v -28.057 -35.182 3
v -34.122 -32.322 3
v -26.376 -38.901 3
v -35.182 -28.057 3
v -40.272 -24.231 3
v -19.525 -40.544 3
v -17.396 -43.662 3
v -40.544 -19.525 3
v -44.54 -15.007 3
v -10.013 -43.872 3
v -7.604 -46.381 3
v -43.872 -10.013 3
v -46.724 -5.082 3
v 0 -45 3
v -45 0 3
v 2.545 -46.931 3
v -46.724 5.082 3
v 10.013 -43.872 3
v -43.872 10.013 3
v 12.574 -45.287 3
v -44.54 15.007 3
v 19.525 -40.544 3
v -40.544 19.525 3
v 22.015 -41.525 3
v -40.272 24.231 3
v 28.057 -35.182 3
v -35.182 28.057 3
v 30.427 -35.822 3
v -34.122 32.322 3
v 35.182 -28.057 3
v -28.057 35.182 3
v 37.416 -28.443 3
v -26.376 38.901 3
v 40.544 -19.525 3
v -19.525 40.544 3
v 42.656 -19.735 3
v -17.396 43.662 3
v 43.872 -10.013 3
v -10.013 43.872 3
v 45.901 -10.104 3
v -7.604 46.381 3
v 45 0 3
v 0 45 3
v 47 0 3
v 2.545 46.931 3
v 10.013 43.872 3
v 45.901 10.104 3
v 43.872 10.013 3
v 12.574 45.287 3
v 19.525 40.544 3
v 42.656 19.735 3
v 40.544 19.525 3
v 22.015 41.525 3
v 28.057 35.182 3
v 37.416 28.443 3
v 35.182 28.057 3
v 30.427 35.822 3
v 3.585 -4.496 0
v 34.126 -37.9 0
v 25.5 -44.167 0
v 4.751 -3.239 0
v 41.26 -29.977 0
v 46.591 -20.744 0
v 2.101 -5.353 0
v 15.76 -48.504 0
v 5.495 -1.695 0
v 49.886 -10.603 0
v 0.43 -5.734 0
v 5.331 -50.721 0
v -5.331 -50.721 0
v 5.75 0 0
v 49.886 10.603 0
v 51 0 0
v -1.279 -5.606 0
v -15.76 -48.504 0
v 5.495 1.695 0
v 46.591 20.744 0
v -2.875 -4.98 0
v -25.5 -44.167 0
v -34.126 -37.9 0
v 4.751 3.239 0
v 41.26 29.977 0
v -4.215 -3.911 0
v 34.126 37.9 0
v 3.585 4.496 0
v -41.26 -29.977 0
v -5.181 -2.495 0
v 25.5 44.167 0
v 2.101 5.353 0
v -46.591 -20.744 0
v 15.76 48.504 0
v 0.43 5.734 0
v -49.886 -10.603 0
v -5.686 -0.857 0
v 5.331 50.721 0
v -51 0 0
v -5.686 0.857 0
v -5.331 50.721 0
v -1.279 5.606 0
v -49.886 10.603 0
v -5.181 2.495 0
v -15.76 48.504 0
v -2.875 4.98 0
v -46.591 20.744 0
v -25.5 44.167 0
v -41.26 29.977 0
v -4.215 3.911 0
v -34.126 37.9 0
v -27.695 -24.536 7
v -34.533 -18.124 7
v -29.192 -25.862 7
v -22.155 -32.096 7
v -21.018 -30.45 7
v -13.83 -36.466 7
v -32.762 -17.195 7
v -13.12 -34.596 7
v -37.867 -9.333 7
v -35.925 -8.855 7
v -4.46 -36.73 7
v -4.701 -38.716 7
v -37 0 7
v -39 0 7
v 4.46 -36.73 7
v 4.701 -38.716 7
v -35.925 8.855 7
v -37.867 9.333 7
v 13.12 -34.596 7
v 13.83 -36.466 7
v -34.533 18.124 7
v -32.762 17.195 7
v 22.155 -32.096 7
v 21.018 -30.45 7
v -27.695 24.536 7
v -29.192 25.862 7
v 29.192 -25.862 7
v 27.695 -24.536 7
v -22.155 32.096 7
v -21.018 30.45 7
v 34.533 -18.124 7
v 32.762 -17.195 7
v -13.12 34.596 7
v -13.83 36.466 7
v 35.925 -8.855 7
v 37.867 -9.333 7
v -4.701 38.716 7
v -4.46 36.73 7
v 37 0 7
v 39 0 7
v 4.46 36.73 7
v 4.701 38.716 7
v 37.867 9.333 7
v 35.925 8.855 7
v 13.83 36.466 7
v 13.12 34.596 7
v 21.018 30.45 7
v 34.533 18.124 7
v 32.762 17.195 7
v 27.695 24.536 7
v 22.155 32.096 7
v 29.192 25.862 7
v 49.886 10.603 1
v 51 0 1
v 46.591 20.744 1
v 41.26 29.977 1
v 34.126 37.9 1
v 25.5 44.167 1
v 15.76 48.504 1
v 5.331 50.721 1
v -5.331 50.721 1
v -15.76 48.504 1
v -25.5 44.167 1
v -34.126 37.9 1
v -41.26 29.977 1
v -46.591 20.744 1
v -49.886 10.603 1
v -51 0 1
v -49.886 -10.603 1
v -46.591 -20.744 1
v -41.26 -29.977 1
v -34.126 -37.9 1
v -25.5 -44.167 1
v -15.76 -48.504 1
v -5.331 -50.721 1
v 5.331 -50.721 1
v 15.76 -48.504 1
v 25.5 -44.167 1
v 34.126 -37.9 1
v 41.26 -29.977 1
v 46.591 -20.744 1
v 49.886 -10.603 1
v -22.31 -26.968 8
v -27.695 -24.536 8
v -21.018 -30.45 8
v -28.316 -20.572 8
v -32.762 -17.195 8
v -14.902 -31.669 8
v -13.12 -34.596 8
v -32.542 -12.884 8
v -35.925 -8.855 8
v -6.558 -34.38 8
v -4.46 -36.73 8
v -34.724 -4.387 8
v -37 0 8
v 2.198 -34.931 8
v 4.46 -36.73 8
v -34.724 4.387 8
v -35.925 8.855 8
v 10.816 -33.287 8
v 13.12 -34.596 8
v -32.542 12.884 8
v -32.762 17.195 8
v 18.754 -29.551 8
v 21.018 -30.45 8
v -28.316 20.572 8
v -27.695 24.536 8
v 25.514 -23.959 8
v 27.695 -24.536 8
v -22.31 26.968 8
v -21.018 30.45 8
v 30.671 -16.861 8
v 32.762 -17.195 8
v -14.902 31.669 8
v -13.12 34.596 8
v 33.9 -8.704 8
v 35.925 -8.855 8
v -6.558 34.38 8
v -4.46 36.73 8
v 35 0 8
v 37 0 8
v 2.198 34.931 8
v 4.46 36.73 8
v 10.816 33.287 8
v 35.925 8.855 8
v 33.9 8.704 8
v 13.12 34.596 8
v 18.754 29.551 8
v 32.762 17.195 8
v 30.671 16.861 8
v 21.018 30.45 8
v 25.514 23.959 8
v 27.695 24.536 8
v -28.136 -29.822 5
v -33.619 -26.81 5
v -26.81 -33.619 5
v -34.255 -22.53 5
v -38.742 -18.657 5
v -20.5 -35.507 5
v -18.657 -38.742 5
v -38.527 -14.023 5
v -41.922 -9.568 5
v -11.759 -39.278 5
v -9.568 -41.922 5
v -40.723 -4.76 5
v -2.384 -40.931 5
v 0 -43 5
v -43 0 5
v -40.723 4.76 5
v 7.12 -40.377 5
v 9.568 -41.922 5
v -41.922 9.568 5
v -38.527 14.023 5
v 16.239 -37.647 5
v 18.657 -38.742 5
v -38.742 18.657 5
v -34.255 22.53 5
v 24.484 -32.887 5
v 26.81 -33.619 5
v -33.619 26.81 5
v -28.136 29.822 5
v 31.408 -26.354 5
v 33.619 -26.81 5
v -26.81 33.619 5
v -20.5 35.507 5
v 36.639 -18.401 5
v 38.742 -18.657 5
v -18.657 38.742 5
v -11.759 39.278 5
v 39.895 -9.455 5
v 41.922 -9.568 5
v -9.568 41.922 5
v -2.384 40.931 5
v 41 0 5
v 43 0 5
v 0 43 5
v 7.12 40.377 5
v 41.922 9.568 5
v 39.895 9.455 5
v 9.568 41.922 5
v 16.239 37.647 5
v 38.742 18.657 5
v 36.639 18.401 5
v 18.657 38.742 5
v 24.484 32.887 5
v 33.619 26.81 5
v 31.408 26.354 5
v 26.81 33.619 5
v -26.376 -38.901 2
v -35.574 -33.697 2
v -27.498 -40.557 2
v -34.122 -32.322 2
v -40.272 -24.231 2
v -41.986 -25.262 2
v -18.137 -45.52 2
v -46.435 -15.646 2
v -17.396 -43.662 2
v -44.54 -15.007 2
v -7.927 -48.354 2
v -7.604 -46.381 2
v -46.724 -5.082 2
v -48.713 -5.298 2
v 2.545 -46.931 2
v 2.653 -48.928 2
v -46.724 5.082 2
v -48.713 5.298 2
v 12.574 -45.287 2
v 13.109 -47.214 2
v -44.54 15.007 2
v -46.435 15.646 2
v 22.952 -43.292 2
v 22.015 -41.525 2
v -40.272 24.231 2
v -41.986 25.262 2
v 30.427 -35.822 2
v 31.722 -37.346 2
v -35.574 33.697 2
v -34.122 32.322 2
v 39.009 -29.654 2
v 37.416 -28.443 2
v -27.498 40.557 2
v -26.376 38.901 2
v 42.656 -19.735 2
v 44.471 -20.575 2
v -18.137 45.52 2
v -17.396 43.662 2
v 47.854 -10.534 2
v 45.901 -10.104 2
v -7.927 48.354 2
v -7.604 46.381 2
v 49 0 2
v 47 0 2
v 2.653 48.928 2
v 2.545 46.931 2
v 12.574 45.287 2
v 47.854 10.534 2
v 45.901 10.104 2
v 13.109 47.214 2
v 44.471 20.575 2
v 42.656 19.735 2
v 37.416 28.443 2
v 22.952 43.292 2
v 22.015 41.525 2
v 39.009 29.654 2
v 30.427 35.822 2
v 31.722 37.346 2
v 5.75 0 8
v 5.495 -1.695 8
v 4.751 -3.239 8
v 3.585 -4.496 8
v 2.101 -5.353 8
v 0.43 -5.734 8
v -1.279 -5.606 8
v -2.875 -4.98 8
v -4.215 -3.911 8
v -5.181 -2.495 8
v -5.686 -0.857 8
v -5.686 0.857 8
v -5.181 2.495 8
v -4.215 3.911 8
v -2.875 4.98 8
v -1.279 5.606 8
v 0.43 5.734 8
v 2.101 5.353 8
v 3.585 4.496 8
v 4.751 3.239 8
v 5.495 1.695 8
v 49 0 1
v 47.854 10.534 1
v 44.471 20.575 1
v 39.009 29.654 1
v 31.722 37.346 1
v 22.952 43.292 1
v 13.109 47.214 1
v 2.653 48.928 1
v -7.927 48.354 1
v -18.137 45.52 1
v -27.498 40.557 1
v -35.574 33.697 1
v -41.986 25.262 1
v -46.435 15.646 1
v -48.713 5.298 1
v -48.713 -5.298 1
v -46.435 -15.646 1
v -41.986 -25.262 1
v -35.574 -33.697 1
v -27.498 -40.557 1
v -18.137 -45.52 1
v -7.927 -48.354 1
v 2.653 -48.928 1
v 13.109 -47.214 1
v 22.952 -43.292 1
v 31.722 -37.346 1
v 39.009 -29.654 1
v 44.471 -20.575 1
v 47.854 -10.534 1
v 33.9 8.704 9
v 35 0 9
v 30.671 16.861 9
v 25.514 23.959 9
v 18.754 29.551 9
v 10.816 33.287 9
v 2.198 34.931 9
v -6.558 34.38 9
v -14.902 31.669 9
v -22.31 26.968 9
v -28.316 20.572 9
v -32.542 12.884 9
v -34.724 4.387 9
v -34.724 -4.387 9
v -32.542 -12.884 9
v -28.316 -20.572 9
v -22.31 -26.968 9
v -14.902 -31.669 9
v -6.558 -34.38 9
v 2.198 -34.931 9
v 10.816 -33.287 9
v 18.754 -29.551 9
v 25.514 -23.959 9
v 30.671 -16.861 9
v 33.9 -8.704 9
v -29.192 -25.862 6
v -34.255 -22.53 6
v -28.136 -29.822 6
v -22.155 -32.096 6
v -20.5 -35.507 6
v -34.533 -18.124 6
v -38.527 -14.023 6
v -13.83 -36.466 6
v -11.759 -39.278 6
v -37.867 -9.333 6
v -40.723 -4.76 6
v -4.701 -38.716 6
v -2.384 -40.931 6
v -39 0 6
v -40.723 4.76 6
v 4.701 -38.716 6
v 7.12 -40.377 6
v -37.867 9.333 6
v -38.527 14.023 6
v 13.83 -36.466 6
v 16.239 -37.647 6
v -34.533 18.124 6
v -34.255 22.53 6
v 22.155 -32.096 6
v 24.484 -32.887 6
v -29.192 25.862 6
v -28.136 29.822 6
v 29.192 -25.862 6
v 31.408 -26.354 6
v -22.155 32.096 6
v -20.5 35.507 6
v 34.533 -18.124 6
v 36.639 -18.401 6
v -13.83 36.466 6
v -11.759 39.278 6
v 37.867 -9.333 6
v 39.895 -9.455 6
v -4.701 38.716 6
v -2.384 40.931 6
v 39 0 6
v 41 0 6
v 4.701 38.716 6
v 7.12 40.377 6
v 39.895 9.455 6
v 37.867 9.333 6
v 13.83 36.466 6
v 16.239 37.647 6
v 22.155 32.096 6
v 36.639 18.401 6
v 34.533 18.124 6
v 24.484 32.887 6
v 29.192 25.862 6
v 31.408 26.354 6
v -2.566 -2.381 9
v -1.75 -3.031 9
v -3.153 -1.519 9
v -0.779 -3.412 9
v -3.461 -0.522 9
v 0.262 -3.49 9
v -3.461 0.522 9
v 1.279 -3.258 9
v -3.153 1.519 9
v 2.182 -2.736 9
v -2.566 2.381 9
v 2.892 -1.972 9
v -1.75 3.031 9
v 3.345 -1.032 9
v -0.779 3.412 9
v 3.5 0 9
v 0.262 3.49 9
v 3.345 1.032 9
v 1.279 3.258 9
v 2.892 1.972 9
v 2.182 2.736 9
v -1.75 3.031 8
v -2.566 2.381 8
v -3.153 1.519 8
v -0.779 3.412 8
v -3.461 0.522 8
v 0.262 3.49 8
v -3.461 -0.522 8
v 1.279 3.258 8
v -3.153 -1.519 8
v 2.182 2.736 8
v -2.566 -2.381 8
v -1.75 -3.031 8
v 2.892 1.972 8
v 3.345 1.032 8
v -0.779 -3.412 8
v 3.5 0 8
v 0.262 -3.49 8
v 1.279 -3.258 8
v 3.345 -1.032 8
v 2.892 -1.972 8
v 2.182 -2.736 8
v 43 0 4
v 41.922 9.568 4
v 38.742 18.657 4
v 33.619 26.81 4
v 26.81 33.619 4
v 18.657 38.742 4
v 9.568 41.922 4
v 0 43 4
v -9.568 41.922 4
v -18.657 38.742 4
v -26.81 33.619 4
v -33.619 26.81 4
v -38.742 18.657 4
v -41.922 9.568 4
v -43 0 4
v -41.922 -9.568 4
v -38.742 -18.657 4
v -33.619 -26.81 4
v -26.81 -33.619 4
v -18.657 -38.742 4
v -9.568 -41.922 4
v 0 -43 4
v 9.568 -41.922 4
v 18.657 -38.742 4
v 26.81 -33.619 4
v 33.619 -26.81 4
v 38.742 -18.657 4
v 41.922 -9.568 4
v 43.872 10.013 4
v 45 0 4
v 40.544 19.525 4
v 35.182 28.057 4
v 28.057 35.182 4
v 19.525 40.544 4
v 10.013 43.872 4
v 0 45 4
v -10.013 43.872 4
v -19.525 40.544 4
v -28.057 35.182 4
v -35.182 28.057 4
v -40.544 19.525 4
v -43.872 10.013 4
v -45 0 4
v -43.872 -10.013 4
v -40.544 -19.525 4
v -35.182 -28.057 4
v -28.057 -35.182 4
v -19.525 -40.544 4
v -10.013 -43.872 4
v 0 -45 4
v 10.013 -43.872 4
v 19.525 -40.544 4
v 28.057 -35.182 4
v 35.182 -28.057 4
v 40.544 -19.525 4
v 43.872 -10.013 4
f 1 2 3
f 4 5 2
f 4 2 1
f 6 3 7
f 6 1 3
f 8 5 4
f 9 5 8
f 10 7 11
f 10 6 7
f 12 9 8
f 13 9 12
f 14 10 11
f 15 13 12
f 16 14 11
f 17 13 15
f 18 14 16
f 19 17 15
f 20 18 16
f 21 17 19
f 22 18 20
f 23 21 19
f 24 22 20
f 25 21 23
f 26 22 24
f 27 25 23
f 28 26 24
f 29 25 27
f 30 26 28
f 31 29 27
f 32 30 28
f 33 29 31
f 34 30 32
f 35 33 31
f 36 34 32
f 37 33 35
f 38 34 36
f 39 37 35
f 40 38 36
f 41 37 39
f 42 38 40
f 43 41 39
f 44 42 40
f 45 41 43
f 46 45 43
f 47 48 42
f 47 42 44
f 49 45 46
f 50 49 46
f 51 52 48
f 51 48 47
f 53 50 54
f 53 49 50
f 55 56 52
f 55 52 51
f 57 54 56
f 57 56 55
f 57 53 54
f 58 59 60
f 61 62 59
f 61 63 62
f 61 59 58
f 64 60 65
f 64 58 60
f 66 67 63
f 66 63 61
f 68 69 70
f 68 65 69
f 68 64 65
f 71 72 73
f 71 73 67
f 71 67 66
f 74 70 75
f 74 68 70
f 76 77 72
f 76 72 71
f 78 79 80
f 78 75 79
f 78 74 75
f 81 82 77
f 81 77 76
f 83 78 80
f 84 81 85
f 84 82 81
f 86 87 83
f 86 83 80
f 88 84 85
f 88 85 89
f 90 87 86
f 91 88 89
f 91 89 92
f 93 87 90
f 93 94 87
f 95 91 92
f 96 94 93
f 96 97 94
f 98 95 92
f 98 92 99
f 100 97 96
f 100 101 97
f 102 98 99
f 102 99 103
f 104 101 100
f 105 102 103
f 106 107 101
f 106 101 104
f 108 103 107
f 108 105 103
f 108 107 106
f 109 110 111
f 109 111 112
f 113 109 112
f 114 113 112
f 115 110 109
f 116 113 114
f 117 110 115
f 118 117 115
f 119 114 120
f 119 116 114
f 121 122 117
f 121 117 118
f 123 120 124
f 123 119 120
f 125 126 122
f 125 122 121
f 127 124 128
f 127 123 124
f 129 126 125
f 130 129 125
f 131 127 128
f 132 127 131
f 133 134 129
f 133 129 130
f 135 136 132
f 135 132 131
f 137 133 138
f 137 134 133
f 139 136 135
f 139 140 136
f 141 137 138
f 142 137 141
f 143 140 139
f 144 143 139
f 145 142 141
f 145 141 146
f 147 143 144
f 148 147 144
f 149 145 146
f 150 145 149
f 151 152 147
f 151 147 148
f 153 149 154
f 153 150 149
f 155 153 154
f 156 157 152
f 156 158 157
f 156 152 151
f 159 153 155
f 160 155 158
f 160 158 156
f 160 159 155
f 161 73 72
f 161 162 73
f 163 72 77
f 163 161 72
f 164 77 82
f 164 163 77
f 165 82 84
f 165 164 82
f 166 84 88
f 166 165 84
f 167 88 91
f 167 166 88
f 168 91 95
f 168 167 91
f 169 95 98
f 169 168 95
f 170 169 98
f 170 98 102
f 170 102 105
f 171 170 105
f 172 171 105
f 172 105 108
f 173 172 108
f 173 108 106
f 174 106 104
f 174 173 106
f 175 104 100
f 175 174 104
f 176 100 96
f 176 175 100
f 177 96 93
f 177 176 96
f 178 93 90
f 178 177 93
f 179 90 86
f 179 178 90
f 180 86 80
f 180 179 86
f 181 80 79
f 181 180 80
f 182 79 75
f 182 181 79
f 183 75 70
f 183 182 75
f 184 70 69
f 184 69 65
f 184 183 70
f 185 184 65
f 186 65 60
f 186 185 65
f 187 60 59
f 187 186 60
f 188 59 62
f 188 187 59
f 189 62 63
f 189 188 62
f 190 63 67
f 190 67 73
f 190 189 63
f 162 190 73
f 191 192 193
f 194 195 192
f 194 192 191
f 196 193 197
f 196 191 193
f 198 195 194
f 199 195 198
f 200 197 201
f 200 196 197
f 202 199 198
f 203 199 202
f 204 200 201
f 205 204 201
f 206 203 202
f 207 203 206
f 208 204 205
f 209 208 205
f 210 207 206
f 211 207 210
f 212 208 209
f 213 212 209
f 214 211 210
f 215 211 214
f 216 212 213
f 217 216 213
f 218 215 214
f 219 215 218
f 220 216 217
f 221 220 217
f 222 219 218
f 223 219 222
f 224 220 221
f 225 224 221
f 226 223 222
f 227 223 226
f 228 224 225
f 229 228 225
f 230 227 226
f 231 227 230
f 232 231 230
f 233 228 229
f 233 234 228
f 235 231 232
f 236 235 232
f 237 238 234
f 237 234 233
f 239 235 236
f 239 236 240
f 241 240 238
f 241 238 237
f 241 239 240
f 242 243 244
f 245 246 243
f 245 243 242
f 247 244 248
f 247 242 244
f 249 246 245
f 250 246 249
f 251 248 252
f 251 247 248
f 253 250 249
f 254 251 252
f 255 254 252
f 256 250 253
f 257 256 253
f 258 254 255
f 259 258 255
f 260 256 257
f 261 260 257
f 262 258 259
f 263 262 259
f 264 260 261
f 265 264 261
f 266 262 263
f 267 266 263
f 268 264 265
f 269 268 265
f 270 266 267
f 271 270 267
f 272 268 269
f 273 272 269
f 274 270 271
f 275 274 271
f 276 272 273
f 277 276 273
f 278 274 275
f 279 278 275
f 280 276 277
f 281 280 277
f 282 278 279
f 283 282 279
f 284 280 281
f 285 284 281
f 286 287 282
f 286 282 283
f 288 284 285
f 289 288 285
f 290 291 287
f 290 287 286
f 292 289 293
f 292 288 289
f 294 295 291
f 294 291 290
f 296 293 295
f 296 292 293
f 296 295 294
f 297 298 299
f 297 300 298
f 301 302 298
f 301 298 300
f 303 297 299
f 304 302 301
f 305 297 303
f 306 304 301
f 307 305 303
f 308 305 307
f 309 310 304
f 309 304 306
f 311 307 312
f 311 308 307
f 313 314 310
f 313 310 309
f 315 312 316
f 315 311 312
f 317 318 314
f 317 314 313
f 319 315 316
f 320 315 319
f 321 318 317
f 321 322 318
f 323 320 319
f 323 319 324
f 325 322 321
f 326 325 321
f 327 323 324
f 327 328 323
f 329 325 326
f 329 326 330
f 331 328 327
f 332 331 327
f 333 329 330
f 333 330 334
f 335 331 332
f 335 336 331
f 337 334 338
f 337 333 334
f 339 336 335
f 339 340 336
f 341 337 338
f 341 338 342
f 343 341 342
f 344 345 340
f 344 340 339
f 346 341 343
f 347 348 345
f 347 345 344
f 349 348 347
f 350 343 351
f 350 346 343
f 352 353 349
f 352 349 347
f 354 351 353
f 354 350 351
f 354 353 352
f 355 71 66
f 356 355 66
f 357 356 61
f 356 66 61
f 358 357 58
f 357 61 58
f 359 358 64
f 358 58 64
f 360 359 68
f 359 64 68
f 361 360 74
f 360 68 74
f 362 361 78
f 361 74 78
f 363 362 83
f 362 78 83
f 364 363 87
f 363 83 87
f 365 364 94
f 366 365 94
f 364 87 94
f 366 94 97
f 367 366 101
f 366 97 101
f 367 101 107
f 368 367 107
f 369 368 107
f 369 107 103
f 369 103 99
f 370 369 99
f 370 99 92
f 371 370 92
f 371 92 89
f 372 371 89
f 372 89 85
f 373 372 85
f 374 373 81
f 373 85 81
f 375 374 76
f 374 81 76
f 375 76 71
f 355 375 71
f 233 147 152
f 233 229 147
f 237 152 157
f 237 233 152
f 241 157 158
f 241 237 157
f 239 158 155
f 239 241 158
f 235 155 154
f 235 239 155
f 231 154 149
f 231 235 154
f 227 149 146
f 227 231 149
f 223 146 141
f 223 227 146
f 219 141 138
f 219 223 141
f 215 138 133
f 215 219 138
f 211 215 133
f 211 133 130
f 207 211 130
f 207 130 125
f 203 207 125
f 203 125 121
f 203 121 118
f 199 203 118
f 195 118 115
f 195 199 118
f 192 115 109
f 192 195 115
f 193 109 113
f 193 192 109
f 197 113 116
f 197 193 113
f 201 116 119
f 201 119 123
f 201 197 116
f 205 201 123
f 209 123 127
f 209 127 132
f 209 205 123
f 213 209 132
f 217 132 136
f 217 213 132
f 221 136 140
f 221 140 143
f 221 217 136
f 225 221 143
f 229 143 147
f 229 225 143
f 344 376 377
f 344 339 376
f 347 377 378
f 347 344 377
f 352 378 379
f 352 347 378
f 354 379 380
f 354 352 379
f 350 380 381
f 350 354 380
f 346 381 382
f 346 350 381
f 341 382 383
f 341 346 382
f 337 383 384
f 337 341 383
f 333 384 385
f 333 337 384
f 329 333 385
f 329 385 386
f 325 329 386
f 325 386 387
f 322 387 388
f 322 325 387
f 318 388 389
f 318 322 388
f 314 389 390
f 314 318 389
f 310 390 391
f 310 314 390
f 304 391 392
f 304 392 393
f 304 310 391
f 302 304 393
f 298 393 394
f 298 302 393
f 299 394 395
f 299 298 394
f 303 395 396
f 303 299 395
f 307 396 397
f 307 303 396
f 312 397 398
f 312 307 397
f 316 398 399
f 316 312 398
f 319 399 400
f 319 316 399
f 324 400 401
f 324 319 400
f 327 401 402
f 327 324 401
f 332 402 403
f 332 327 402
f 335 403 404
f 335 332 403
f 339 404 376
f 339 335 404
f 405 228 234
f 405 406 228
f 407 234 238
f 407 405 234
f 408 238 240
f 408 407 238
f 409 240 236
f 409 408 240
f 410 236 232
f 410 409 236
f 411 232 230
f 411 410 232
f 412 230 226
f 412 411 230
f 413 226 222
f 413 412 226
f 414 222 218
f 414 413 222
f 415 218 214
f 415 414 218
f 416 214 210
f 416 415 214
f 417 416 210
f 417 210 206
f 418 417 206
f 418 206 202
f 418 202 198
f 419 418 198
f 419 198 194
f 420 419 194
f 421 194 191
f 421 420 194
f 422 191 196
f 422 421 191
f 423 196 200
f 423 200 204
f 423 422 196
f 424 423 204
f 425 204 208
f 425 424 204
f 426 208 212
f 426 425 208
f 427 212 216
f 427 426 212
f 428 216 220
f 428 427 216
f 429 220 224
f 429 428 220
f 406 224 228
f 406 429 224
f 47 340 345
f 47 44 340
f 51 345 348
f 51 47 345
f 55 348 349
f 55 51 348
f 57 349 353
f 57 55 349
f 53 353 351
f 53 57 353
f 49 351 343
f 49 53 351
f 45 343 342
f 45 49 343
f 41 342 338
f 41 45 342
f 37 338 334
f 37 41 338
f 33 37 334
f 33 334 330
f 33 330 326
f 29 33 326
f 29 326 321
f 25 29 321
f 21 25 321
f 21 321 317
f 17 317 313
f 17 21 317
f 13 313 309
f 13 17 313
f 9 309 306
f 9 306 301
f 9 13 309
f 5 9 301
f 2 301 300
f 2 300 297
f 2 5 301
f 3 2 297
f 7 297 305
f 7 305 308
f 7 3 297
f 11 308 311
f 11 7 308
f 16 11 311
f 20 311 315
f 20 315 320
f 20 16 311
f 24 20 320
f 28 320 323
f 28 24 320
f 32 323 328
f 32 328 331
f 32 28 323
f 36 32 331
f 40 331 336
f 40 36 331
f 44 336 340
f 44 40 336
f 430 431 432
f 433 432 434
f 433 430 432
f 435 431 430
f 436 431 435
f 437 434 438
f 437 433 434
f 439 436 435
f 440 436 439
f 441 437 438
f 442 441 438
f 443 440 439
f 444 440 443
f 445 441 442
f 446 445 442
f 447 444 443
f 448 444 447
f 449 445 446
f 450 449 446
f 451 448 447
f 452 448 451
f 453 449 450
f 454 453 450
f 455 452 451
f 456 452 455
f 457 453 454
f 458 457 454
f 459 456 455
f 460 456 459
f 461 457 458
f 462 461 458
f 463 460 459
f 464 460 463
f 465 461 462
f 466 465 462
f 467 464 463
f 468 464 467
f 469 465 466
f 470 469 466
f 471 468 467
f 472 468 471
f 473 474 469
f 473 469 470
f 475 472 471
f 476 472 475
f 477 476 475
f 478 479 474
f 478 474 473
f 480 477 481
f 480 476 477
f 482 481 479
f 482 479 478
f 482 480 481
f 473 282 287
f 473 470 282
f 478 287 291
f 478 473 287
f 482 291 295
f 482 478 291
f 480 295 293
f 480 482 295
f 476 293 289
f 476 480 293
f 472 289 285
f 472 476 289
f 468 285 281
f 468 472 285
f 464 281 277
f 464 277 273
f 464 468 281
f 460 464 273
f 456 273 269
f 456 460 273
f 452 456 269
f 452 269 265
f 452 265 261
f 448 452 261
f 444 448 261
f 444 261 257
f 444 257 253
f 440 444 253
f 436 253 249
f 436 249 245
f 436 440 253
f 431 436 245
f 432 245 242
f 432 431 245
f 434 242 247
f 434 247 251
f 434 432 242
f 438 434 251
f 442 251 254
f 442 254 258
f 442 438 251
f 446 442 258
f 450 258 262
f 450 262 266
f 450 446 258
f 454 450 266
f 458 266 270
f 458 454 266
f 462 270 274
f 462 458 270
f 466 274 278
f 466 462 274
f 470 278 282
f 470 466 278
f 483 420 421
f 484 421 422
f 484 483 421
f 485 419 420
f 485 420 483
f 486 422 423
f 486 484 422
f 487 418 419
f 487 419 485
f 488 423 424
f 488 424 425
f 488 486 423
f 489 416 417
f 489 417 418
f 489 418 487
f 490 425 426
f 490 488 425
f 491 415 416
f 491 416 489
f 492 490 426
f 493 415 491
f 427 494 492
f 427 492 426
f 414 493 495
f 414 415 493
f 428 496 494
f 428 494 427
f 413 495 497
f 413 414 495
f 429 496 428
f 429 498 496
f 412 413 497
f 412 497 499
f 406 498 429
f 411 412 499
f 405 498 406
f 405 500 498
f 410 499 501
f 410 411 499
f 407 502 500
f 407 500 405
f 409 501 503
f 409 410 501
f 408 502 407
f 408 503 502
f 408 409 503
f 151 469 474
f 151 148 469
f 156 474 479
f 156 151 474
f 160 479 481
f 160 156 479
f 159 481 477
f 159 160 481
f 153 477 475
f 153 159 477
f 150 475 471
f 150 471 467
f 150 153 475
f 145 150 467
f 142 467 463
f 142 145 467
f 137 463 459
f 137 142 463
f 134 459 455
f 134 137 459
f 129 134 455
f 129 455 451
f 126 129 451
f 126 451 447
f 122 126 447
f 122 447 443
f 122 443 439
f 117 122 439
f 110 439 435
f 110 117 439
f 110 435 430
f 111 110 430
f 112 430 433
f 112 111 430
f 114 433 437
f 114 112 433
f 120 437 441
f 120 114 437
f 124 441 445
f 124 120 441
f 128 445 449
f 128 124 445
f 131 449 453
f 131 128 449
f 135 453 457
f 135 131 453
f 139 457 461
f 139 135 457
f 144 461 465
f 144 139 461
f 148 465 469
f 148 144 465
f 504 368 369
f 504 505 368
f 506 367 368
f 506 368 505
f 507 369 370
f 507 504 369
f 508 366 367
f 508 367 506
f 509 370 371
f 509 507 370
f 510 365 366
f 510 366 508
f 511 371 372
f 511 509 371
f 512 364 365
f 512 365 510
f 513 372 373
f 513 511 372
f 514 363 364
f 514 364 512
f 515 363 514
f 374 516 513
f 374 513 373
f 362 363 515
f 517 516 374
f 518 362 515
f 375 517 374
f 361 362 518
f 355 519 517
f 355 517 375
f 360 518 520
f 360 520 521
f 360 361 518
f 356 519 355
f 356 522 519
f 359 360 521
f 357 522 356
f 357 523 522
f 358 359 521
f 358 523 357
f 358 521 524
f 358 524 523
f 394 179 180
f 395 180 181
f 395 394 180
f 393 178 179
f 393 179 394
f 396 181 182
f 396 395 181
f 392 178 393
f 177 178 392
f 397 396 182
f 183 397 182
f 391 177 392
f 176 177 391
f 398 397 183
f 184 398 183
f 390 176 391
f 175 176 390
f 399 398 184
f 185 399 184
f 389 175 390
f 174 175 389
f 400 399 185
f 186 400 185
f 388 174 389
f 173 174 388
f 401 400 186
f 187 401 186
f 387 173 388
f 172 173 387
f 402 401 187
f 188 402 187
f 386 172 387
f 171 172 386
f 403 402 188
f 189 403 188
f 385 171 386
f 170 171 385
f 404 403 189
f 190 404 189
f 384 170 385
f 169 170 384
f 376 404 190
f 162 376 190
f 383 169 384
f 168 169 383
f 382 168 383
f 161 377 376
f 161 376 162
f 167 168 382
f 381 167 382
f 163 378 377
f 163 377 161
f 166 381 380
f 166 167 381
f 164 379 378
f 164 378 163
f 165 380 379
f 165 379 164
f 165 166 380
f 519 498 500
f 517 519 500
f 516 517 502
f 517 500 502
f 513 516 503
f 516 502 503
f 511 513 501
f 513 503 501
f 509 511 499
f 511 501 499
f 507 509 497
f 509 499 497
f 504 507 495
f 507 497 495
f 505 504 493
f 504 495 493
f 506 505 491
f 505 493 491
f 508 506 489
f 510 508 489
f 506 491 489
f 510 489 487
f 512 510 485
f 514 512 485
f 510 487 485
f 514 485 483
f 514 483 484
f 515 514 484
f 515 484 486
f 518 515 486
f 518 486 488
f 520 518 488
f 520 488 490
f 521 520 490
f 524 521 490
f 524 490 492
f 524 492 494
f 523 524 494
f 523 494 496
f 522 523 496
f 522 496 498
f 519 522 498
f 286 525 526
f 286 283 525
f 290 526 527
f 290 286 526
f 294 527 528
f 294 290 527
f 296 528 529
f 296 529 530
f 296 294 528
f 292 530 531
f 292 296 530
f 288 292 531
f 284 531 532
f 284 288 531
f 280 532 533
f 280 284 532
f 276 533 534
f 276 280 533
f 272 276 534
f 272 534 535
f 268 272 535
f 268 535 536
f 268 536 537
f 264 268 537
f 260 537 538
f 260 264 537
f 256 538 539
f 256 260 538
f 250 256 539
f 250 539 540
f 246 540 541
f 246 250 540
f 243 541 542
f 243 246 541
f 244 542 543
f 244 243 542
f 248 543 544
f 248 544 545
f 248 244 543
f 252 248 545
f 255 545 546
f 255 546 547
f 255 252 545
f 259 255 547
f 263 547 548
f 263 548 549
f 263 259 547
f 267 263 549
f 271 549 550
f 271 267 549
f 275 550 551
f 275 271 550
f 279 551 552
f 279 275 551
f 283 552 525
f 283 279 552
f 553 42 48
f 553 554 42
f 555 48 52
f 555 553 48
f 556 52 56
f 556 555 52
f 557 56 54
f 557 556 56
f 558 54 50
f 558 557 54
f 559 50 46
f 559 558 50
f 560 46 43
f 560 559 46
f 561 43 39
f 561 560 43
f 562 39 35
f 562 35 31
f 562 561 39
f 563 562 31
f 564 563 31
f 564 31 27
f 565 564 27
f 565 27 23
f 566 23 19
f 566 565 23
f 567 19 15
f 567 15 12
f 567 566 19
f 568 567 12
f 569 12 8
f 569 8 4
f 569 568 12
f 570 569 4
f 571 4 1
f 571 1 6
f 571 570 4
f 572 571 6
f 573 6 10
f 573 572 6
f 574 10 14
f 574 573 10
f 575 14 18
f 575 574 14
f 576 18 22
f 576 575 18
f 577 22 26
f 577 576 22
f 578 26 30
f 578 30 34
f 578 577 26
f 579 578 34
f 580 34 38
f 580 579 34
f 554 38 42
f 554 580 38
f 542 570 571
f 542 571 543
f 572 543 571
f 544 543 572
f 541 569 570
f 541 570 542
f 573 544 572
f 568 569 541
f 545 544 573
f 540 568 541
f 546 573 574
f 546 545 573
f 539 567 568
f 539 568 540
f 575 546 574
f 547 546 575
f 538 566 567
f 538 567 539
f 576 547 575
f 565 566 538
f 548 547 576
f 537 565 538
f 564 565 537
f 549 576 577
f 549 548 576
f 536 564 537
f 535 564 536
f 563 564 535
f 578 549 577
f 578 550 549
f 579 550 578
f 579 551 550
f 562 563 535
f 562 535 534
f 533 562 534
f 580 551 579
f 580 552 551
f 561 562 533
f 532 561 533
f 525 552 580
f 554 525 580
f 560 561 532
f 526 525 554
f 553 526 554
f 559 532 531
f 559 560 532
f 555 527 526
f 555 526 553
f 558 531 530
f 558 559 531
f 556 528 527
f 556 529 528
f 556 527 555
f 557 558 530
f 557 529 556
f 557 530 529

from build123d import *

# Parameters (mm, degrees)
F2_R     = 3.5
F3_DEPTH = 9.001
F4_R     = 5.75
F5_DEPTH = 8


with BuildPart() as f1:
    # F0 (on Front) → F1 (revolve)
    with BuildSketch(Plane.XZ):
        Polygon((0, 9), (0, 0), (51, 0), (51, 1), (49, 1), (49, 2), (47, 2), (47, 3), (45, 3), (45, 4), (43, 4), (43, 5), (41, 5), (41, 6), (39, 6), (39, 7), (37, 7), (37, 8), (35, 8), (35, 9), align=None)
    revolve(axis=Axis((0, 0, 4.5), (0, 0, 1)))

    # F2 (on face) → F3 (cut, through all)
    with BuildSketch(Plane.XY.offset(9)):
        Circle(F2_R)
    extrude(amount=-F3_DEPTH, mode=Mode.SUBTRACT)

    # F4 (on face) → F5 (cut)
    with BuildSketch(Plane(origin=(0, 0, 0), x_dir=(1, 0, 0), z_dir=(0, 0, -1))):
        Circle(F4_R)
    extrude(amount=-F5_DEPTH, mode=Mode.SUBTRACT)


solid = f1.part
